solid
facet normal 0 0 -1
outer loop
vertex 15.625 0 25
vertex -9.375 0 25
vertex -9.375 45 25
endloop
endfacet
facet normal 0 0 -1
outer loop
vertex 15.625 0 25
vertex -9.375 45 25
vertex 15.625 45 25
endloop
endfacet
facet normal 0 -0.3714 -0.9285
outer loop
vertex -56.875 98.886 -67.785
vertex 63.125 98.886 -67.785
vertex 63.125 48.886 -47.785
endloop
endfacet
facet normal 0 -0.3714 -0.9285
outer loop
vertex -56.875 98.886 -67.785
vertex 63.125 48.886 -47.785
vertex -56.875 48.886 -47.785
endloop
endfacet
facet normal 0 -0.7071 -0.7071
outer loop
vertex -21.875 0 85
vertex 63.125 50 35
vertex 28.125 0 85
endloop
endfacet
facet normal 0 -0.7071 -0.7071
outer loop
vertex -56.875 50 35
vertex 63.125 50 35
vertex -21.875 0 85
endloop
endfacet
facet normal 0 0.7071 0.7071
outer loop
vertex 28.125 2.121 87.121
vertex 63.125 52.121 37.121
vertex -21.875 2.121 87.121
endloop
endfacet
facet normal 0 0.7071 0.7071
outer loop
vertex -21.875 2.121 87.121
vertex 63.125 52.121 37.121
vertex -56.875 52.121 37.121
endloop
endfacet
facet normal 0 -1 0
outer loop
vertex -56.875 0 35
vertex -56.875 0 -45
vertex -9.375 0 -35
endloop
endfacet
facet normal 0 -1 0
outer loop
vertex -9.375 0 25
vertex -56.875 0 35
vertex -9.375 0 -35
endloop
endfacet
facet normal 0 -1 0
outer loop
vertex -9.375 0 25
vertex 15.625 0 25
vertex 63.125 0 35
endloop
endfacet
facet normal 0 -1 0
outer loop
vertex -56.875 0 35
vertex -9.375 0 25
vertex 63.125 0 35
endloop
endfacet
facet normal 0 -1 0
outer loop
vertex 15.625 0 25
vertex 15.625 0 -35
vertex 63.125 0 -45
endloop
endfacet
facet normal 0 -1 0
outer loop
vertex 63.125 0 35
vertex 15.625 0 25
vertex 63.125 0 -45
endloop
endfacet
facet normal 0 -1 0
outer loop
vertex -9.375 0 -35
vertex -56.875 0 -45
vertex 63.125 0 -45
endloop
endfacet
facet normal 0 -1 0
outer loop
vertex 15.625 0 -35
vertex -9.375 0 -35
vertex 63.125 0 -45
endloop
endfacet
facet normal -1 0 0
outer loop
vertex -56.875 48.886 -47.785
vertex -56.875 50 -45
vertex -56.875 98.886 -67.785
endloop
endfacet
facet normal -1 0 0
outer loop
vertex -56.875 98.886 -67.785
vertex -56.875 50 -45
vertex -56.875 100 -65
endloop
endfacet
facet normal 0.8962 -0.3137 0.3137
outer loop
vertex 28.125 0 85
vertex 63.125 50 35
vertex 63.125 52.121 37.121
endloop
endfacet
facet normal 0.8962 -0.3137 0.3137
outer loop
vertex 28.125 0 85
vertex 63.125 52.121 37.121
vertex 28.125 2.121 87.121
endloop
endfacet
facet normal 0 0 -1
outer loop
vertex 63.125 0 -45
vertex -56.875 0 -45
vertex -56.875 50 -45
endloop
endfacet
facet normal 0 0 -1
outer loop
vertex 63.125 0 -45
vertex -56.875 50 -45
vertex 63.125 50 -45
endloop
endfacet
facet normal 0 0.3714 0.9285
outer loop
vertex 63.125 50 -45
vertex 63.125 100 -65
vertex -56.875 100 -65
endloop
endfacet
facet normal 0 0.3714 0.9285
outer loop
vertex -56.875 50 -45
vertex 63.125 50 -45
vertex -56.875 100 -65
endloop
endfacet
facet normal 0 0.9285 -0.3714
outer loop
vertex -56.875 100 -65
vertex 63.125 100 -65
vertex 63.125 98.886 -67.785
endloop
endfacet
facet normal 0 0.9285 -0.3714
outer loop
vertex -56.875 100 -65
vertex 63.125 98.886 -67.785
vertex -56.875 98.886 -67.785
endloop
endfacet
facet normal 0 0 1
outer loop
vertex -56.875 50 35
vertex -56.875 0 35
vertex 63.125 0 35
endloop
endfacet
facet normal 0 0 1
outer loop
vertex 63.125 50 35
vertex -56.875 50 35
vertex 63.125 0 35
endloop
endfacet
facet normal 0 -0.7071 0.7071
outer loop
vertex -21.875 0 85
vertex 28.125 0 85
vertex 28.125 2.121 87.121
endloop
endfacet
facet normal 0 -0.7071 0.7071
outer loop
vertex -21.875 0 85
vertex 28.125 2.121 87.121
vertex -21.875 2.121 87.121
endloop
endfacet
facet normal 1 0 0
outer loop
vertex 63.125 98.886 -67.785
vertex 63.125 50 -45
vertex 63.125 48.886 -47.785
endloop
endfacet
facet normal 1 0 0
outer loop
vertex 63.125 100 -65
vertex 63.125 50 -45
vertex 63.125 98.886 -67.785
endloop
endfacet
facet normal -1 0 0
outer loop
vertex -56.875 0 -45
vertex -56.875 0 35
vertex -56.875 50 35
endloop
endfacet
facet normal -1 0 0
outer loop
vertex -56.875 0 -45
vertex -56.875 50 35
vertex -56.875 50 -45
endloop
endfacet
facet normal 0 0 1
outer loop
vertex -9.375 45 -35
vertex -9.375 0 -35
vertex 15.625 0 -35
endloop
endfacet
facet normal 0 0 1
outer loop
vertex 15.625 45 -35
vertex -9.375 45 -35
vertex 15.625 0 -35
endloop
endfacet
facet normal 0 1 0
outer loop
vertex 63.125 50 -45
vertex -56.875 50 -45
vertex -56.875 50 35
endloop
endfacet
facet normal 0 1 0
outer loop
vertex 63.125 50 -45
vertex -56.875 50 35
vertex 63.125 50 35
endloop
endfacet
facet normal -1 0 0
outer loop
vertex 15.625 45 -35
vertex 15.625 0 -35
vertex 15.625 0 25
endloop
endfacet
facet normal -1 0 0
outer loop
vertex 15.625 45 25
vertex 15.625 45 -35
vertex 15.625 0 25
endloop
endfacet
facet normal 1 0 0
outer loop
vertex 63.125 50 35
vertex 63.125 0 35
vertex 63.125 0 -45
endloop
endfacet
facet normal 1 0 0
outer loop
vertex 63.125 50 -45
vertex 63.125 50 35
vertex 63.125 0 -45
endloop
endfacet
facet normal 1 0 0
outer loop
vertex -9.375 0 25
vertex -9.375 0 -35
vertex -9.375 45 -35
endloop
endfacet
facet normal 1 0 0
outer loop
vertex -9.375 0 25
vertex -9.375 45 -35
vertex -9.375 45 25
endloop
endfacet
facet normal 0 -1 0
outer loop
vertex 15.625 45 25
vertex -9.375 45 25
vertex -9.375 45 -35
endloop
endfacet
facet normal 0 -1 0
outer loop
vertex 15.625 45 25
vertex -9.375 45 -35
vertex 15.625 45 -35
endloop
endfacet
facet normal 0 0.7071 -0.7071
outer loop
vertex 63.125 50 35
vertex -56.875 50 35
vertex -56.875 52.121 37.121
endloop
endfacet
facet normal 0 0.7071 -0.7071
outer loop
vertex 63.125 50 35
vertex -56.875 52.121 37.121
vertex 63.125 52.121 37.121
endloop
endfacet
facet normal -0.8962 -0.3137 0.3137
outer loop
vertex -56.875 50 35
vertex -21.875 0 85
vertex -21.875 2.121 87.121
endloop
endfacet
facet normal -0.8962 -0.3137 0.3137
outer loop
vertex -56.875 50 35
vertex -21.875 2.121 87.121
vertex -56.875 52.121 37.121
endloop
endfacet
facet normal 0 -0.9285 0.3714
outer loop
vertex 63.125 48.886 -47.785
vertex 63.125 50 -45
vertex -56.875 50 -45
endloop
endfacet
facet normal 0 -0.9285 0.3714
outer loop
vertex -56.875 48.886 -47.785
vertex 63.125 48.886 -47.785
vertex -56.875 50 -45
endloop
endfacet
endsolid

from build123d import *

# Parameters (mm, degrees)
SKETCH1_W           = 120
SKETCH1_H           = 80
BOSS_EXTRUDE3_DEPTH = 50
SKETCH4_W           = 120
SKETCH4_H           = 53.851648072
BOSS_EXTRUDE4_DEPTH = 3
BOSS_EXTRUDE5_DEPTH = 3
SKETCH7_W           = 25
SKETCH7_H           = 60
CUT_EXTRUDE1_DEPTH  = 45


with BuildPart() as part:
    # Sketch1 → Boss-Extrude3 (new body)
    with BuildSketch(Plane(origin=(0, 0, 0), x_dir=(1, 0, 0), z_dir=(0, 1, 0))):
        with Locations((3.125, 5)):
            Rectangle(SKETCH1_W, SKETCH1_H)
    extrude(amount=BOSS_EXTRUDE3_DEPTH)

    # Sketch7 → Cut-Extrude1 (cut)
    with BuildSketch(Plane.XZ):
        with Locations((3.125, -5)):
            Rectangle(SKETCH7_W, SKETCH7_H)
    extrude(amount=-CUT_EXTRUDE1_DEPTH, mode=Mode.SUBTRACT)


with BuildPart() as body_2:
    # Sketch4 → Boss-Extrude4 (new body)
    with BuildSketch(Plane(origin=(0, -8.620689655, -21.551724138), x_dir=(-1, 0, 0), z_dir=(0, -0.3713906763541038, -0.9284766908852594))):
        with Locations((-3.125, 90.062239016)):
            Rectangle(SKETCH4_W, SKETCH4_H)
    extrude(amount=BOSS_EXTRUDE4_DEPTH)


with BuildPart() as body_3:
    # Sketch6 → Boss-Extrude5 (new body)
    with BuildSketch(Plane(origin=(0, 42.5, 42.5), x_dir=(1, 0, 0), z_dir=(0, 0.7071067811865475, 0.7071067811865477))):
        Polygon((-21.875, -60.104076401), (-56.875, 10.606601718), (63.125, 10.606601718), (28.125, -60.104076401), align=None)
    extrude(amount=BOSS_EXTRUDE5_DEPTH)


solid = Compound([part.part, body_2.part, body_3.part])
